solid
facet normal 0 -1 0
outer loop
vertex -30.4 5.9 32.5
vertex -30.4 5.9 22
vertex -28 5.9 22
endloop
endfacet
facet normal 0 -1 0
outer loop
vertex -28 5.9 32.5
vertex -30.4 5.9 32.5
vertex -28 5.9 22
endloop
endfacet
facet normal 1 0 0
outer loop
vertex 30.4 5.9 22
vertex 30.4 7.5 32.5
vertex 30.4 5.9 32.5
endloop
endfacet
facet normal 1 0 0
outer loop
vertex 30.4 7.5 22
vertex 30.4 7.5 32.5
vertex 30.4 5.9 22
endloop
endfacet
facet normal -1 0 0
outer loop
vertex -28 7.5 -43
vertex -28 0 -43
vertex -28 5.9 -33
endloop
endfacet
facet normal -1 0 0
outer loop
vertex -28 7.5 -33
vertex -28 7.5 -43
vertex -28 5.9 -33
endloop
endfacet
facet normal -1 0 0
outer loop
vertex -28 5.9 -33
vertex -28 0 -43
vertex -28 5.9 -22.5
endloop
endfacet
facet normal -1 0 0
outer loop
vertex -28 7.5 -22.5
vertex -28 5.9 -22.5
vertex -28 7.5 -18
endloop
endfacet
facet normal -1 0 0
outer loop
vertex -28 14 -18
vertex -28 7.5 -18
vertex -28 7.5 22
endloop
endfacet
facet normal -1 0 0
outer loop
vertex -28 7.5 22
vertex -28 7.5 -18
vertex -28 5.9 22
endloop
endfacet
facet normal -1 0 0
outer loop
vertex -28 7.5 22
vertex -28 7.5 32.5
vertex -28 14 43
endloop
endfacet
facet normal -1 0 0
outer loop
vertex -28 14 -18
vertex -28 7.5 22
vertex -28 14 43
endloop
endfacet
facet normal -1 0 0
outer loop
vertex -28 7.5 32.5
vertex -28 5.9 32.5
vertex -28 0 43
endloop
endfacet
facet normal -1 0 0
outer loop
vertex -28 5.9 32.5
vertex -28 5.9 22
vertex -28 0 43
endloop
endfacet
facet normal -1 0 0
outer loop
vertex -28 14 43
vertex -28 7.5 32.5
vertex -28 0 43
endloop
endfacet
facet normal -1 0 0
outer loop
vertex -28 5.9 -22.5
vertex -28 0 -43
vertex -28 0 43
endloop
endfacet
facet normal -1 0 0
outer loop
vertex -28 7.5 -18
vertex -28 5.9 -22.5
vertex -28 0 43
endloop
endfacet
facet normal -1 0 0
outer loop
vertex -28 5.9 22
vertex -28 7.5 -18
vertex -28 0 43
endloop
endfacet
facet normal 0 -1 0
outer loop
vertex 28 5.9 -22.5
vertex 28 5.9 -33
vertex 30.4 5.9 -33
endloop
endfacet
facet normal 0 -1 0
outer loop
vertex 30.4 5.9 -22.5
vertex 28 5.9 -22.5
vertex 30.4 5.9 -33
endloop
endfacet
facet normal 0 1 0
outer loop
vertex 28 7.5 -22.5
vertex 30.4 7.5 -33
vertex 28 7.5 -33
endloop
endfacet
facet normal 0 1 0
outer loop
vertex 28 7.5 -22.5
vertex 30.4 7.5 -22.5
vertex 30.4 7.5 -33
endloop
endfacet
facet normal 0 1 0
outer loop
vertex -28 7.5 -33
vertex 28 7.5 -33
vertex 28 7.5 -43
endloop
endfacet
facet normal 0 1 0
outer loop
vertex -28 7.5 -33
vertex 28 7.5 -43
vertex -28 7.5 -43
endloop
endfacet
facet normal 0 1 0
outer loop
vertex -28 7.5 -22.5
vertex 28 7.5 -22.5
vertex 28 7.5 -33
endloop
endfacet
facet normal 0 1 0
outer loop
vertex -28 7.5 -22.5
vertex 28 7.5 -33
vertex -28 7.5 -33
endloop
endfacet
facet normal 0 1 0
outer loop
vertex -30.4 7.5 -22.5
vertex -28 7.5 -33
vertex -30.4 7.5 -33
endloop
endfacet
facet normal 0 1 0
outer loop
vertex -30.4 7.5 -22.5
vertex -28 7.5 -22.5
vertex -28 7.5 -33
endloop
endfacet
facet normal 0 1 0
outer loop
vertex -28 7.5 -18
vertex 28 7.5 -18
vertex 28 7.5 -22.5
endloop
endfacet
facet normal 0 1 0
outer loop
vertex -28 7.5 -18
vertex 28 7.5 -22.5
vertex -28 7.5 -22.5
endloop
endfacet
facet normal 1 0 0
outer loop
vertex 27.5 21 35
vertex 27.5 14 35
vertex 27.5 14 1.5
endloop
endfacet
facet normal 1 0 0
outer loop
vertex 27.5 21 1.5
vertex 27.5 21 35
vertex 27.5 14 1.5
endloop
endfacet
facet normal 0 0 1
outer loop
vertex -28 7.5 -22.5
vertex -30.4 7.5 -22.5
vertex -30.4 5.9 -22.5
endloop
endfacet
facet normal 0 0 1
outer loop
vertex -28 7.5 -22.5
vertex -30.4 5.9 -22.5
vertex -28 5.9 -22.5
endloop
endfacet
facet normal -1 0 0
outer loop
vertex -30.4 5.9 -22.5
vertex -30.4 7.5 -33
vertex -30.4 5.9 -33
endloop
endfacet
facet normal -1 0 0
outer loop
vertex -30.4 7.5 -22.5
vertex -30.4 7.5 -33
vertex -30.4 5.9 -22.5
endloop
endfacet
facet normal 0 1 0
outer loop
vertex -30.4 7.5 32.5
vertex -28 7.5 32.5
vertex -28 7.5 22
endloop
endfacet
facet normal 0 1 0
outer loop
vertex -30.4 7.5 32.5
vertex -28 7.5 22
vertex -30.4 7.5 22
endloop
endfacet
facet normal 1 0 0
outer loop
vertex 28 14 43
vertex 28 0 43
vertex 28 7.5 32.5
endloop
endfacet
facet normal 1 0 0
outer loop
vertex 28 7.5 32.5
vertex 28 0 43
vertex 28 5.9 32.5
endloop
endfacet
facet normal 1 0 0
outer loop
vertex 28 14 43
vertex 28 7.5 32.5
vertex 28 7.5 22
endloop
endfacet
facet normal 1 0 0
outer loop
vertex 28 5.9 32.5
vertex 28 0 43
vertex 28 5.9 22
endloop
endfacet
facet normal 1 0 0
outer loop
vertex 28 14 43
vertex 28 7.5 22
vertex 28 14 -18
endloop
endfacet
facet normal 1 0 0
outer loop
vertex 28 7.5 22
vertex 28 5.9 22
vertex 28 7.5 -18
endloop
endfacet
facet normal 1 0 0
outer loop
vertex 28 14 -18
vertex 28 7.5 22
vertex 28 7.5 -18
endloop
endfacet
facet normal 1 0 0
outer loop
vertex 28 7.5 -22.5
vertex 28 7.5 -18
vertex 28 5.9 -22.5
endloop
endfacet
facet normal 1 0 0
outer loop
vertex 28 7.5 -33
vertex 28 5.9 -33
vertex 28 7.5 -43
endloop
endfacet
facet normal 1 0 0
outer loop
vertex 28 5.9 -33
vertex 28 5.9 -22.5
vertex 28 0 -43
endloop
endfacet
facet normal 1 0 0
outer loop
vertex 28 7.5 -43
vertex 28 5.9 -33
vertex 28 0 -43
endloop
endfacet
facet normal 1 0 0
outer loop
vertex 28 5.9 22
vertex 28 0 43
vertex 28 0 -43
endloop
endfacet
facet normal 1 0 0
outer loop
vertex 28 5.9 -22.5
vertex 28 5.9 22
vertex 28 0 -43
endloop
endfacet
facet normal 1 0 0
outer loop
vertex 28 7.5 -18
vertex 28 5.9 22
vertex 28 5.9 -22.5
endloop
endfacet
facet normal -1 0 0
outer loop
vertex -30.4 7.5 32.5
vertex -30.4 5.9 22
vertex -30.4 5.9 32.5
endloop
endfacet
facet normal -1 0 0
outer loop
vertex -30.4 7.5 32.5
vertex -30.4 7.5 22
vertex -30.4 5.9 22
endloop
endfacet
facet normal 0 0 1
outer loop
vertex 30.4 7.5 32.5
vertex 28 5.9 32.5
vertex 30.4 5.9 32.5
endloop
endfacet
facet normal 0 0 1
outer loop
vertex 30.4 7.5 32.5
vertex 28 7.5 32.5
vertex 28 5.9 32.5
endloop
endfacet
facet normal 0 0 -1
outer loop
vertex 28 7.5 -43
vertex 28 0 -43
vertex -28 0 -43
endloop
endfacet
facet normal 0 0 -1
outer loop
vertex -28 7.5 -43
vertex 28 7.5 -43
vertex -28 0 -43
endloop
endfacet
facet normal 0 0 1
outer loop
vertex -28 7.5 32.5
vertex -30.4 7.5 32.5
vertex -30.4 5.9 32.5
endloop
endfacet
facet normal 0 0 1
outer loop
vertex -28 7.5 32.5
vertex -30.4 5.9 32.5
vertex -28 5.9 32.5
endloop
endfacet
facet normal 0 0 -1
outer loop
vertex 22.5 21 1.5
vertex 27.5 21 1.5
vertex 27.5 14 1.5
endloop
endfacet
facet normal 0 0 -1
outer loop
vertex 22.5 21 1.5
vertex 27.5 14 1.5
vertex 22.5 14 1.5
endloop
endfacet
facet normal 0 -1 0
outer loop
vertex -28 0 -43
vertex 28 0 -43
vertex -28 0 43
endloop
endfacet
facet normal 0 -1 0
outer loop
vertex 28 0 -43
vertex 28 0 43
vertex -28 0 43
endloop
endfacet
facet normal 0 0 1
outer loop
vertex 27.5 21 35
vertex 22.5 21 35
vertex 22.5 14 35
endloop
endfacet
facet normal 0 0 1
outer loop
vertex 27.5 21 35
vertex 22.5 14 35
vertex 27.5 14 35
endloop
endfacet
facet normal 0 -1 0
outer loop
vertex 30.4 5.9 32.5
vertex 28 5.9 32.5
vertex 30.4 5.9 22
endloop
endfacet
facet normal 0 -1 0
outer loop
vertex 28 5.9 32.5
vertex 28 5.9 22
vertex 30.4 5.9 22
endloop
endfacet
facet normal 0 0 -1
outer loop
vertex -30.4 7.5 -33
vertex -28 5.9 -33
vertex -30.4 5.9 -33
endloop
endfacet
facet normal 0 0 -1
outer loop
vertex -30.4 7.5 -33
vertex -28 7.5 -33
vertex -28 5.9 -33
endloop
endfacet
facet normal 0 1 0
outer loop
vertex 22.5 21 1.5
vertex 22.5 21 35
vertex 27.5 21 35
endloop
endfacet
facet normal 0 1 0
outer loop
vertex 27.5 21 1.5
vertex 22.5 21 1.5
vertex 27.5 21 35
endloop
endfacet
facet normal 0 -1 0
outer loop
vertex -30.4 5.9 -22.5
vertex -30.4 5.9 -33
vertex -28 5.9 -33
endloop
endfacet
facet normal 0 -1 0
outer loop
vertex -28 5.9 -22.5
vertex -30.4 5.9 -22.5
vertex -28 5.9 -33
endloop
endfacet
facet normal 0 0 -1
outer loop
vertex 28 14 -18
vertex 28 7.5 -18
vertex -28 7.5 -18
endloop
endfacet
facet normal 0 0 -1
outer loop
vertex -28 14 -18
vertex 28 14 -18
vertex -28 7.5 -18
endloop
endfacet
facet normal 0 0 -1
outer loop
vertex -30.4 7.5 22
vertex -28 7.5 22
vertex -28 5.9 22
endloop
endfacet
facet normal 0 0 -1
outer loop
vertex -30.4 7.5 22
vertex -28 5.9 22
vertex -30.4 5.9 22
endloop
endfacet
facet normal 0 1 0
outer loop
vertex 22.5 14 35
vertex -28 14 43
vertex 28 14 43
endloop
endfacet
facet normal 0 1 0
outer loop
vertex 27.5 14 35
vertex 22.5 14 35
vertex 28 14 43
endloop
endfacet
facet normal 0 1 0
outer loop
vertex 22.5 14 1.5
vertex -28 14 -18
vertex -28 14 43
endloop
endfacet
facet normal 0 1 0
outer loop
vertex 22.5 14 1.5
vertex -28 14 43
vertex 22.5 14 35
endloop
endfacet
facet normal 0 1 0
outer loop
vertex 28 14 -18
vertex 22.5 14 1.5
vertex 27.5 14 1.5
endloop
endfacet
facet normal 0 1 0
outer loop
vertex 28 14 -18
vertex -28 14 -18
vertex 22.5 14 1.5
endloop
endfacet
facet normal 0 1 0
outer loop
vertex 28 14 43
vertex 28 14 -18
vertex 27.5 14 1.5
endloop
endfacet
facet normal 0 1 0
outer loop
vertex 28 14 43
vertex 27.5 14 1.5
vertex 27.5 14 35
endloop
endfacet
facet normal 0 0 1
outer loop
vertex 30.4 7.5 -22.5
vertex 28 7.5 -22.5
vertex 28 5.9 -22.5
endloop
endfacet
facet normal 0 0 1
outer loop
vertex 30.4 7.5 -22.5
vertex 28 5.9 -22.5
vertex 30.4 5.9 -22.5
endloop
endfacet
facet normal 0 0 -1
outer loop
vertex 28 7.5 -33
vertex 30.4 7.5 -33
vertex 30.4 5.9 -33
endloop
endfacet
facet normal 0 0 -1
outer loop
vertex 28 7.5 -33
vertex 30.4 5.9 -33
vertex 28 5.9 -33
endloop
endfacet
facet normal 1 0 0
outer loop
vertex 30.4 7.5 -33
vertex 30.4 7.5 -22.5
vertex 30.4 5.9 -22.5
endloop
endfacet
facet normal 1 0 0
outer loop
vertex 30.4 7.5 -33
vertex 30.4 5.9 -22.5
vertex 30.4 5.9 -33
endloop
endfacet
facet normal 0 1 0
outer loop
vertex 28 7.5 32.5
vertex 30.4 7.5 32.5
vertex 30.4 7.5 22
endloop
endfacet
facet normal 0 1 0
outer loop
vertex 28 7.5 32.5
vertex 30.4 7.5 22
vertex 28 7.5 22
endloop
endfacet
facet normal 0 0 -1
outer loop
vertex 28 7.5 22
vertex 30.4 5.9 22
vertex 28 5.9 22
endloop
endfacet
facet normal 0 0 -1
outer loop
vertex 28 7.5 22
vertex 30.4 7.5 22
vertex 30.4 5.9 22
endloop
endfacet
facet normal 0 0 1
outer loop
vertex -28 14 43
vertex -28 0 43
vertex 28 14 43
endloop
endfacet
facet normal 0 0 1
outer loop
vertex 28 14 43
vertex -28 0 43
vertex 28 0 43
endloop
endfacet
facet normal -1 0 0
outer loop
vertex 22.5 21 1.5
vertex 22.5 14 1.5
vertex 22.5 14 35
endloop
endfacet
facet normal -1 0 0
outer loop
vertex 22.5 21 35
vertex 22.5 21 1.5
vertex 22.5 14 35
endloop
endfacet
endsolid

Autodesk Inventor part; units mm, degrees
ref_plane "YZ Plane" through (0, 0, 0) normal (1, 0, 0) x (0, 1, 0)
ref_plane "XZ Plane" through (0, 0, 0) normal (0, 1, 0) x (-1, 0, 0)
ref_plane "XY Plane" through (0, 0, 0) normal (0, 0, 1) x (1, 0, 0)
sketch "Sketch1" plane through (0, 0, 0) normal (0, 1, 0) x (-1, 0, 0)
  line L0 (28, 43) -> (-28, 43)
  line L1 (-28, 43) -> (-28, -43)
  line L2 (-28, -43) -> (28, -43)
  line L3 (28, -43) -> (28, 43)
  point P0 (0, 0)
  dimension "d0" = 56
  dimension "d1" = 86
  dimension "d4" = 28
  dimension "d5" = 43
extrude "Extrusion1" add sketch "Sketch1" along normal blind 7.5
sketch "Sketch3" plane through (0, 7.5, 0) normal (0, 1, 0) x (1, 0, 0)
  line L0 (22.5, -35) -> (27.5, -35)
  line L1 (27.5, -35) -> (27.5, -1.5)
  line L2 (27.5, -1.5) -> (22.5, -1.5)
  line L3 (22.5, -1.5) -> (22.5, -35)
  line L4 (-28, -43) -> (28, -43) projected
  line L5 (28, -43) -> (28, 43) projected
  point P0 (0, 0)
  dimension "d6" = 33.5
  dimension "d7" = 5
  dimension "d8" = 8
  dimension "d9" = 0.5
extrude "Extrusion2" add sketch "Sketch3" along normal blind 13.5
sketch "Sketch4" plane through (0, 7.5, 0) normal (0, 1, 0) x (1, 0, 0)
  line L0 (-28, 43) -> (-28, -43) projected
  line L1 (-30.4, -32.5) -> (-28, -32.5)
  line L2 (-28, -32.5) -> (-28, -22)
  line L3 (-28, -22) -> (-30.4, -22)
  line L4 (-30.4, -22) -> (-30.4, -32.5)
  line L5 (-30.4, 22.5) -> (-28, 22.5)
  line L6 (-28, 22.5) -> (-28, 33)
  line L7 (-28, 33) -> (-30.4, 33)
  line L8 (-30.4, 33) -> (-30.4, 22.5)
  line L9 (28, -43) -> (28, 43) projected
  line L10 (28, 22.5) -> (30.4, 22.5)
  line L11 (30.4, 22.5) -> (30.4, 33)
  line L12 (30.4, 33) -> (28, 33)
  line L13 (28, 33) -> (28, 22.5)
  line L14 (28, -32.5) -> (30.4, -32.5)
  line L15 (30.4, -32.5) -> (30.4, -22)
  line L16 (30.4, -22) -> (28, -22)
  line L17 (28, -22) -> (28, -32.5)
  line L18 (-28, -43) -> (28, -43) projected
  line L19 (28, 43) -> (-28, 43) projected
  point P0 (0, 0)
  dimension "d12" = 10.5
  dimension "d13" = 10.5
  dimension "d14" = 10.5
  dimension "d15" = 10
  dimension "d16" = 2.4
  dimension "d17" = 2.4
extrude "Extrusion3" add sketch "Sketch4" against normal blind 1.6 contours L0 L5 L8 L7 | L12 L11 L10 L9 | L0 L1 L4 L3 | L16 L15 L14 L9
sketch "Sketch5" plane through (0, 7.5, 0) normal (0, 1, 0) x (1, 0, 0)
  line L0 (-28, 43) -> (-28, -43) projected
  line L1 (28, -22) -> (28, 22.5) projected
  line L2 (-28, -43) -> (28, -43)
  line L3 (28, -43) -> (28, 18)
  line L4 (28, 18) -> (-28, 18)
  line L5 (-28, 18) -> (-28, -43)
  line L6 (28, 43) -> (-28, 43) projected
  point P0 (0, 0)
  dimension "d20" = 25
extrude "Extrusion4" add sketch "Sketch5" along normal blind 6.5
properties part number "Screen_Model"
